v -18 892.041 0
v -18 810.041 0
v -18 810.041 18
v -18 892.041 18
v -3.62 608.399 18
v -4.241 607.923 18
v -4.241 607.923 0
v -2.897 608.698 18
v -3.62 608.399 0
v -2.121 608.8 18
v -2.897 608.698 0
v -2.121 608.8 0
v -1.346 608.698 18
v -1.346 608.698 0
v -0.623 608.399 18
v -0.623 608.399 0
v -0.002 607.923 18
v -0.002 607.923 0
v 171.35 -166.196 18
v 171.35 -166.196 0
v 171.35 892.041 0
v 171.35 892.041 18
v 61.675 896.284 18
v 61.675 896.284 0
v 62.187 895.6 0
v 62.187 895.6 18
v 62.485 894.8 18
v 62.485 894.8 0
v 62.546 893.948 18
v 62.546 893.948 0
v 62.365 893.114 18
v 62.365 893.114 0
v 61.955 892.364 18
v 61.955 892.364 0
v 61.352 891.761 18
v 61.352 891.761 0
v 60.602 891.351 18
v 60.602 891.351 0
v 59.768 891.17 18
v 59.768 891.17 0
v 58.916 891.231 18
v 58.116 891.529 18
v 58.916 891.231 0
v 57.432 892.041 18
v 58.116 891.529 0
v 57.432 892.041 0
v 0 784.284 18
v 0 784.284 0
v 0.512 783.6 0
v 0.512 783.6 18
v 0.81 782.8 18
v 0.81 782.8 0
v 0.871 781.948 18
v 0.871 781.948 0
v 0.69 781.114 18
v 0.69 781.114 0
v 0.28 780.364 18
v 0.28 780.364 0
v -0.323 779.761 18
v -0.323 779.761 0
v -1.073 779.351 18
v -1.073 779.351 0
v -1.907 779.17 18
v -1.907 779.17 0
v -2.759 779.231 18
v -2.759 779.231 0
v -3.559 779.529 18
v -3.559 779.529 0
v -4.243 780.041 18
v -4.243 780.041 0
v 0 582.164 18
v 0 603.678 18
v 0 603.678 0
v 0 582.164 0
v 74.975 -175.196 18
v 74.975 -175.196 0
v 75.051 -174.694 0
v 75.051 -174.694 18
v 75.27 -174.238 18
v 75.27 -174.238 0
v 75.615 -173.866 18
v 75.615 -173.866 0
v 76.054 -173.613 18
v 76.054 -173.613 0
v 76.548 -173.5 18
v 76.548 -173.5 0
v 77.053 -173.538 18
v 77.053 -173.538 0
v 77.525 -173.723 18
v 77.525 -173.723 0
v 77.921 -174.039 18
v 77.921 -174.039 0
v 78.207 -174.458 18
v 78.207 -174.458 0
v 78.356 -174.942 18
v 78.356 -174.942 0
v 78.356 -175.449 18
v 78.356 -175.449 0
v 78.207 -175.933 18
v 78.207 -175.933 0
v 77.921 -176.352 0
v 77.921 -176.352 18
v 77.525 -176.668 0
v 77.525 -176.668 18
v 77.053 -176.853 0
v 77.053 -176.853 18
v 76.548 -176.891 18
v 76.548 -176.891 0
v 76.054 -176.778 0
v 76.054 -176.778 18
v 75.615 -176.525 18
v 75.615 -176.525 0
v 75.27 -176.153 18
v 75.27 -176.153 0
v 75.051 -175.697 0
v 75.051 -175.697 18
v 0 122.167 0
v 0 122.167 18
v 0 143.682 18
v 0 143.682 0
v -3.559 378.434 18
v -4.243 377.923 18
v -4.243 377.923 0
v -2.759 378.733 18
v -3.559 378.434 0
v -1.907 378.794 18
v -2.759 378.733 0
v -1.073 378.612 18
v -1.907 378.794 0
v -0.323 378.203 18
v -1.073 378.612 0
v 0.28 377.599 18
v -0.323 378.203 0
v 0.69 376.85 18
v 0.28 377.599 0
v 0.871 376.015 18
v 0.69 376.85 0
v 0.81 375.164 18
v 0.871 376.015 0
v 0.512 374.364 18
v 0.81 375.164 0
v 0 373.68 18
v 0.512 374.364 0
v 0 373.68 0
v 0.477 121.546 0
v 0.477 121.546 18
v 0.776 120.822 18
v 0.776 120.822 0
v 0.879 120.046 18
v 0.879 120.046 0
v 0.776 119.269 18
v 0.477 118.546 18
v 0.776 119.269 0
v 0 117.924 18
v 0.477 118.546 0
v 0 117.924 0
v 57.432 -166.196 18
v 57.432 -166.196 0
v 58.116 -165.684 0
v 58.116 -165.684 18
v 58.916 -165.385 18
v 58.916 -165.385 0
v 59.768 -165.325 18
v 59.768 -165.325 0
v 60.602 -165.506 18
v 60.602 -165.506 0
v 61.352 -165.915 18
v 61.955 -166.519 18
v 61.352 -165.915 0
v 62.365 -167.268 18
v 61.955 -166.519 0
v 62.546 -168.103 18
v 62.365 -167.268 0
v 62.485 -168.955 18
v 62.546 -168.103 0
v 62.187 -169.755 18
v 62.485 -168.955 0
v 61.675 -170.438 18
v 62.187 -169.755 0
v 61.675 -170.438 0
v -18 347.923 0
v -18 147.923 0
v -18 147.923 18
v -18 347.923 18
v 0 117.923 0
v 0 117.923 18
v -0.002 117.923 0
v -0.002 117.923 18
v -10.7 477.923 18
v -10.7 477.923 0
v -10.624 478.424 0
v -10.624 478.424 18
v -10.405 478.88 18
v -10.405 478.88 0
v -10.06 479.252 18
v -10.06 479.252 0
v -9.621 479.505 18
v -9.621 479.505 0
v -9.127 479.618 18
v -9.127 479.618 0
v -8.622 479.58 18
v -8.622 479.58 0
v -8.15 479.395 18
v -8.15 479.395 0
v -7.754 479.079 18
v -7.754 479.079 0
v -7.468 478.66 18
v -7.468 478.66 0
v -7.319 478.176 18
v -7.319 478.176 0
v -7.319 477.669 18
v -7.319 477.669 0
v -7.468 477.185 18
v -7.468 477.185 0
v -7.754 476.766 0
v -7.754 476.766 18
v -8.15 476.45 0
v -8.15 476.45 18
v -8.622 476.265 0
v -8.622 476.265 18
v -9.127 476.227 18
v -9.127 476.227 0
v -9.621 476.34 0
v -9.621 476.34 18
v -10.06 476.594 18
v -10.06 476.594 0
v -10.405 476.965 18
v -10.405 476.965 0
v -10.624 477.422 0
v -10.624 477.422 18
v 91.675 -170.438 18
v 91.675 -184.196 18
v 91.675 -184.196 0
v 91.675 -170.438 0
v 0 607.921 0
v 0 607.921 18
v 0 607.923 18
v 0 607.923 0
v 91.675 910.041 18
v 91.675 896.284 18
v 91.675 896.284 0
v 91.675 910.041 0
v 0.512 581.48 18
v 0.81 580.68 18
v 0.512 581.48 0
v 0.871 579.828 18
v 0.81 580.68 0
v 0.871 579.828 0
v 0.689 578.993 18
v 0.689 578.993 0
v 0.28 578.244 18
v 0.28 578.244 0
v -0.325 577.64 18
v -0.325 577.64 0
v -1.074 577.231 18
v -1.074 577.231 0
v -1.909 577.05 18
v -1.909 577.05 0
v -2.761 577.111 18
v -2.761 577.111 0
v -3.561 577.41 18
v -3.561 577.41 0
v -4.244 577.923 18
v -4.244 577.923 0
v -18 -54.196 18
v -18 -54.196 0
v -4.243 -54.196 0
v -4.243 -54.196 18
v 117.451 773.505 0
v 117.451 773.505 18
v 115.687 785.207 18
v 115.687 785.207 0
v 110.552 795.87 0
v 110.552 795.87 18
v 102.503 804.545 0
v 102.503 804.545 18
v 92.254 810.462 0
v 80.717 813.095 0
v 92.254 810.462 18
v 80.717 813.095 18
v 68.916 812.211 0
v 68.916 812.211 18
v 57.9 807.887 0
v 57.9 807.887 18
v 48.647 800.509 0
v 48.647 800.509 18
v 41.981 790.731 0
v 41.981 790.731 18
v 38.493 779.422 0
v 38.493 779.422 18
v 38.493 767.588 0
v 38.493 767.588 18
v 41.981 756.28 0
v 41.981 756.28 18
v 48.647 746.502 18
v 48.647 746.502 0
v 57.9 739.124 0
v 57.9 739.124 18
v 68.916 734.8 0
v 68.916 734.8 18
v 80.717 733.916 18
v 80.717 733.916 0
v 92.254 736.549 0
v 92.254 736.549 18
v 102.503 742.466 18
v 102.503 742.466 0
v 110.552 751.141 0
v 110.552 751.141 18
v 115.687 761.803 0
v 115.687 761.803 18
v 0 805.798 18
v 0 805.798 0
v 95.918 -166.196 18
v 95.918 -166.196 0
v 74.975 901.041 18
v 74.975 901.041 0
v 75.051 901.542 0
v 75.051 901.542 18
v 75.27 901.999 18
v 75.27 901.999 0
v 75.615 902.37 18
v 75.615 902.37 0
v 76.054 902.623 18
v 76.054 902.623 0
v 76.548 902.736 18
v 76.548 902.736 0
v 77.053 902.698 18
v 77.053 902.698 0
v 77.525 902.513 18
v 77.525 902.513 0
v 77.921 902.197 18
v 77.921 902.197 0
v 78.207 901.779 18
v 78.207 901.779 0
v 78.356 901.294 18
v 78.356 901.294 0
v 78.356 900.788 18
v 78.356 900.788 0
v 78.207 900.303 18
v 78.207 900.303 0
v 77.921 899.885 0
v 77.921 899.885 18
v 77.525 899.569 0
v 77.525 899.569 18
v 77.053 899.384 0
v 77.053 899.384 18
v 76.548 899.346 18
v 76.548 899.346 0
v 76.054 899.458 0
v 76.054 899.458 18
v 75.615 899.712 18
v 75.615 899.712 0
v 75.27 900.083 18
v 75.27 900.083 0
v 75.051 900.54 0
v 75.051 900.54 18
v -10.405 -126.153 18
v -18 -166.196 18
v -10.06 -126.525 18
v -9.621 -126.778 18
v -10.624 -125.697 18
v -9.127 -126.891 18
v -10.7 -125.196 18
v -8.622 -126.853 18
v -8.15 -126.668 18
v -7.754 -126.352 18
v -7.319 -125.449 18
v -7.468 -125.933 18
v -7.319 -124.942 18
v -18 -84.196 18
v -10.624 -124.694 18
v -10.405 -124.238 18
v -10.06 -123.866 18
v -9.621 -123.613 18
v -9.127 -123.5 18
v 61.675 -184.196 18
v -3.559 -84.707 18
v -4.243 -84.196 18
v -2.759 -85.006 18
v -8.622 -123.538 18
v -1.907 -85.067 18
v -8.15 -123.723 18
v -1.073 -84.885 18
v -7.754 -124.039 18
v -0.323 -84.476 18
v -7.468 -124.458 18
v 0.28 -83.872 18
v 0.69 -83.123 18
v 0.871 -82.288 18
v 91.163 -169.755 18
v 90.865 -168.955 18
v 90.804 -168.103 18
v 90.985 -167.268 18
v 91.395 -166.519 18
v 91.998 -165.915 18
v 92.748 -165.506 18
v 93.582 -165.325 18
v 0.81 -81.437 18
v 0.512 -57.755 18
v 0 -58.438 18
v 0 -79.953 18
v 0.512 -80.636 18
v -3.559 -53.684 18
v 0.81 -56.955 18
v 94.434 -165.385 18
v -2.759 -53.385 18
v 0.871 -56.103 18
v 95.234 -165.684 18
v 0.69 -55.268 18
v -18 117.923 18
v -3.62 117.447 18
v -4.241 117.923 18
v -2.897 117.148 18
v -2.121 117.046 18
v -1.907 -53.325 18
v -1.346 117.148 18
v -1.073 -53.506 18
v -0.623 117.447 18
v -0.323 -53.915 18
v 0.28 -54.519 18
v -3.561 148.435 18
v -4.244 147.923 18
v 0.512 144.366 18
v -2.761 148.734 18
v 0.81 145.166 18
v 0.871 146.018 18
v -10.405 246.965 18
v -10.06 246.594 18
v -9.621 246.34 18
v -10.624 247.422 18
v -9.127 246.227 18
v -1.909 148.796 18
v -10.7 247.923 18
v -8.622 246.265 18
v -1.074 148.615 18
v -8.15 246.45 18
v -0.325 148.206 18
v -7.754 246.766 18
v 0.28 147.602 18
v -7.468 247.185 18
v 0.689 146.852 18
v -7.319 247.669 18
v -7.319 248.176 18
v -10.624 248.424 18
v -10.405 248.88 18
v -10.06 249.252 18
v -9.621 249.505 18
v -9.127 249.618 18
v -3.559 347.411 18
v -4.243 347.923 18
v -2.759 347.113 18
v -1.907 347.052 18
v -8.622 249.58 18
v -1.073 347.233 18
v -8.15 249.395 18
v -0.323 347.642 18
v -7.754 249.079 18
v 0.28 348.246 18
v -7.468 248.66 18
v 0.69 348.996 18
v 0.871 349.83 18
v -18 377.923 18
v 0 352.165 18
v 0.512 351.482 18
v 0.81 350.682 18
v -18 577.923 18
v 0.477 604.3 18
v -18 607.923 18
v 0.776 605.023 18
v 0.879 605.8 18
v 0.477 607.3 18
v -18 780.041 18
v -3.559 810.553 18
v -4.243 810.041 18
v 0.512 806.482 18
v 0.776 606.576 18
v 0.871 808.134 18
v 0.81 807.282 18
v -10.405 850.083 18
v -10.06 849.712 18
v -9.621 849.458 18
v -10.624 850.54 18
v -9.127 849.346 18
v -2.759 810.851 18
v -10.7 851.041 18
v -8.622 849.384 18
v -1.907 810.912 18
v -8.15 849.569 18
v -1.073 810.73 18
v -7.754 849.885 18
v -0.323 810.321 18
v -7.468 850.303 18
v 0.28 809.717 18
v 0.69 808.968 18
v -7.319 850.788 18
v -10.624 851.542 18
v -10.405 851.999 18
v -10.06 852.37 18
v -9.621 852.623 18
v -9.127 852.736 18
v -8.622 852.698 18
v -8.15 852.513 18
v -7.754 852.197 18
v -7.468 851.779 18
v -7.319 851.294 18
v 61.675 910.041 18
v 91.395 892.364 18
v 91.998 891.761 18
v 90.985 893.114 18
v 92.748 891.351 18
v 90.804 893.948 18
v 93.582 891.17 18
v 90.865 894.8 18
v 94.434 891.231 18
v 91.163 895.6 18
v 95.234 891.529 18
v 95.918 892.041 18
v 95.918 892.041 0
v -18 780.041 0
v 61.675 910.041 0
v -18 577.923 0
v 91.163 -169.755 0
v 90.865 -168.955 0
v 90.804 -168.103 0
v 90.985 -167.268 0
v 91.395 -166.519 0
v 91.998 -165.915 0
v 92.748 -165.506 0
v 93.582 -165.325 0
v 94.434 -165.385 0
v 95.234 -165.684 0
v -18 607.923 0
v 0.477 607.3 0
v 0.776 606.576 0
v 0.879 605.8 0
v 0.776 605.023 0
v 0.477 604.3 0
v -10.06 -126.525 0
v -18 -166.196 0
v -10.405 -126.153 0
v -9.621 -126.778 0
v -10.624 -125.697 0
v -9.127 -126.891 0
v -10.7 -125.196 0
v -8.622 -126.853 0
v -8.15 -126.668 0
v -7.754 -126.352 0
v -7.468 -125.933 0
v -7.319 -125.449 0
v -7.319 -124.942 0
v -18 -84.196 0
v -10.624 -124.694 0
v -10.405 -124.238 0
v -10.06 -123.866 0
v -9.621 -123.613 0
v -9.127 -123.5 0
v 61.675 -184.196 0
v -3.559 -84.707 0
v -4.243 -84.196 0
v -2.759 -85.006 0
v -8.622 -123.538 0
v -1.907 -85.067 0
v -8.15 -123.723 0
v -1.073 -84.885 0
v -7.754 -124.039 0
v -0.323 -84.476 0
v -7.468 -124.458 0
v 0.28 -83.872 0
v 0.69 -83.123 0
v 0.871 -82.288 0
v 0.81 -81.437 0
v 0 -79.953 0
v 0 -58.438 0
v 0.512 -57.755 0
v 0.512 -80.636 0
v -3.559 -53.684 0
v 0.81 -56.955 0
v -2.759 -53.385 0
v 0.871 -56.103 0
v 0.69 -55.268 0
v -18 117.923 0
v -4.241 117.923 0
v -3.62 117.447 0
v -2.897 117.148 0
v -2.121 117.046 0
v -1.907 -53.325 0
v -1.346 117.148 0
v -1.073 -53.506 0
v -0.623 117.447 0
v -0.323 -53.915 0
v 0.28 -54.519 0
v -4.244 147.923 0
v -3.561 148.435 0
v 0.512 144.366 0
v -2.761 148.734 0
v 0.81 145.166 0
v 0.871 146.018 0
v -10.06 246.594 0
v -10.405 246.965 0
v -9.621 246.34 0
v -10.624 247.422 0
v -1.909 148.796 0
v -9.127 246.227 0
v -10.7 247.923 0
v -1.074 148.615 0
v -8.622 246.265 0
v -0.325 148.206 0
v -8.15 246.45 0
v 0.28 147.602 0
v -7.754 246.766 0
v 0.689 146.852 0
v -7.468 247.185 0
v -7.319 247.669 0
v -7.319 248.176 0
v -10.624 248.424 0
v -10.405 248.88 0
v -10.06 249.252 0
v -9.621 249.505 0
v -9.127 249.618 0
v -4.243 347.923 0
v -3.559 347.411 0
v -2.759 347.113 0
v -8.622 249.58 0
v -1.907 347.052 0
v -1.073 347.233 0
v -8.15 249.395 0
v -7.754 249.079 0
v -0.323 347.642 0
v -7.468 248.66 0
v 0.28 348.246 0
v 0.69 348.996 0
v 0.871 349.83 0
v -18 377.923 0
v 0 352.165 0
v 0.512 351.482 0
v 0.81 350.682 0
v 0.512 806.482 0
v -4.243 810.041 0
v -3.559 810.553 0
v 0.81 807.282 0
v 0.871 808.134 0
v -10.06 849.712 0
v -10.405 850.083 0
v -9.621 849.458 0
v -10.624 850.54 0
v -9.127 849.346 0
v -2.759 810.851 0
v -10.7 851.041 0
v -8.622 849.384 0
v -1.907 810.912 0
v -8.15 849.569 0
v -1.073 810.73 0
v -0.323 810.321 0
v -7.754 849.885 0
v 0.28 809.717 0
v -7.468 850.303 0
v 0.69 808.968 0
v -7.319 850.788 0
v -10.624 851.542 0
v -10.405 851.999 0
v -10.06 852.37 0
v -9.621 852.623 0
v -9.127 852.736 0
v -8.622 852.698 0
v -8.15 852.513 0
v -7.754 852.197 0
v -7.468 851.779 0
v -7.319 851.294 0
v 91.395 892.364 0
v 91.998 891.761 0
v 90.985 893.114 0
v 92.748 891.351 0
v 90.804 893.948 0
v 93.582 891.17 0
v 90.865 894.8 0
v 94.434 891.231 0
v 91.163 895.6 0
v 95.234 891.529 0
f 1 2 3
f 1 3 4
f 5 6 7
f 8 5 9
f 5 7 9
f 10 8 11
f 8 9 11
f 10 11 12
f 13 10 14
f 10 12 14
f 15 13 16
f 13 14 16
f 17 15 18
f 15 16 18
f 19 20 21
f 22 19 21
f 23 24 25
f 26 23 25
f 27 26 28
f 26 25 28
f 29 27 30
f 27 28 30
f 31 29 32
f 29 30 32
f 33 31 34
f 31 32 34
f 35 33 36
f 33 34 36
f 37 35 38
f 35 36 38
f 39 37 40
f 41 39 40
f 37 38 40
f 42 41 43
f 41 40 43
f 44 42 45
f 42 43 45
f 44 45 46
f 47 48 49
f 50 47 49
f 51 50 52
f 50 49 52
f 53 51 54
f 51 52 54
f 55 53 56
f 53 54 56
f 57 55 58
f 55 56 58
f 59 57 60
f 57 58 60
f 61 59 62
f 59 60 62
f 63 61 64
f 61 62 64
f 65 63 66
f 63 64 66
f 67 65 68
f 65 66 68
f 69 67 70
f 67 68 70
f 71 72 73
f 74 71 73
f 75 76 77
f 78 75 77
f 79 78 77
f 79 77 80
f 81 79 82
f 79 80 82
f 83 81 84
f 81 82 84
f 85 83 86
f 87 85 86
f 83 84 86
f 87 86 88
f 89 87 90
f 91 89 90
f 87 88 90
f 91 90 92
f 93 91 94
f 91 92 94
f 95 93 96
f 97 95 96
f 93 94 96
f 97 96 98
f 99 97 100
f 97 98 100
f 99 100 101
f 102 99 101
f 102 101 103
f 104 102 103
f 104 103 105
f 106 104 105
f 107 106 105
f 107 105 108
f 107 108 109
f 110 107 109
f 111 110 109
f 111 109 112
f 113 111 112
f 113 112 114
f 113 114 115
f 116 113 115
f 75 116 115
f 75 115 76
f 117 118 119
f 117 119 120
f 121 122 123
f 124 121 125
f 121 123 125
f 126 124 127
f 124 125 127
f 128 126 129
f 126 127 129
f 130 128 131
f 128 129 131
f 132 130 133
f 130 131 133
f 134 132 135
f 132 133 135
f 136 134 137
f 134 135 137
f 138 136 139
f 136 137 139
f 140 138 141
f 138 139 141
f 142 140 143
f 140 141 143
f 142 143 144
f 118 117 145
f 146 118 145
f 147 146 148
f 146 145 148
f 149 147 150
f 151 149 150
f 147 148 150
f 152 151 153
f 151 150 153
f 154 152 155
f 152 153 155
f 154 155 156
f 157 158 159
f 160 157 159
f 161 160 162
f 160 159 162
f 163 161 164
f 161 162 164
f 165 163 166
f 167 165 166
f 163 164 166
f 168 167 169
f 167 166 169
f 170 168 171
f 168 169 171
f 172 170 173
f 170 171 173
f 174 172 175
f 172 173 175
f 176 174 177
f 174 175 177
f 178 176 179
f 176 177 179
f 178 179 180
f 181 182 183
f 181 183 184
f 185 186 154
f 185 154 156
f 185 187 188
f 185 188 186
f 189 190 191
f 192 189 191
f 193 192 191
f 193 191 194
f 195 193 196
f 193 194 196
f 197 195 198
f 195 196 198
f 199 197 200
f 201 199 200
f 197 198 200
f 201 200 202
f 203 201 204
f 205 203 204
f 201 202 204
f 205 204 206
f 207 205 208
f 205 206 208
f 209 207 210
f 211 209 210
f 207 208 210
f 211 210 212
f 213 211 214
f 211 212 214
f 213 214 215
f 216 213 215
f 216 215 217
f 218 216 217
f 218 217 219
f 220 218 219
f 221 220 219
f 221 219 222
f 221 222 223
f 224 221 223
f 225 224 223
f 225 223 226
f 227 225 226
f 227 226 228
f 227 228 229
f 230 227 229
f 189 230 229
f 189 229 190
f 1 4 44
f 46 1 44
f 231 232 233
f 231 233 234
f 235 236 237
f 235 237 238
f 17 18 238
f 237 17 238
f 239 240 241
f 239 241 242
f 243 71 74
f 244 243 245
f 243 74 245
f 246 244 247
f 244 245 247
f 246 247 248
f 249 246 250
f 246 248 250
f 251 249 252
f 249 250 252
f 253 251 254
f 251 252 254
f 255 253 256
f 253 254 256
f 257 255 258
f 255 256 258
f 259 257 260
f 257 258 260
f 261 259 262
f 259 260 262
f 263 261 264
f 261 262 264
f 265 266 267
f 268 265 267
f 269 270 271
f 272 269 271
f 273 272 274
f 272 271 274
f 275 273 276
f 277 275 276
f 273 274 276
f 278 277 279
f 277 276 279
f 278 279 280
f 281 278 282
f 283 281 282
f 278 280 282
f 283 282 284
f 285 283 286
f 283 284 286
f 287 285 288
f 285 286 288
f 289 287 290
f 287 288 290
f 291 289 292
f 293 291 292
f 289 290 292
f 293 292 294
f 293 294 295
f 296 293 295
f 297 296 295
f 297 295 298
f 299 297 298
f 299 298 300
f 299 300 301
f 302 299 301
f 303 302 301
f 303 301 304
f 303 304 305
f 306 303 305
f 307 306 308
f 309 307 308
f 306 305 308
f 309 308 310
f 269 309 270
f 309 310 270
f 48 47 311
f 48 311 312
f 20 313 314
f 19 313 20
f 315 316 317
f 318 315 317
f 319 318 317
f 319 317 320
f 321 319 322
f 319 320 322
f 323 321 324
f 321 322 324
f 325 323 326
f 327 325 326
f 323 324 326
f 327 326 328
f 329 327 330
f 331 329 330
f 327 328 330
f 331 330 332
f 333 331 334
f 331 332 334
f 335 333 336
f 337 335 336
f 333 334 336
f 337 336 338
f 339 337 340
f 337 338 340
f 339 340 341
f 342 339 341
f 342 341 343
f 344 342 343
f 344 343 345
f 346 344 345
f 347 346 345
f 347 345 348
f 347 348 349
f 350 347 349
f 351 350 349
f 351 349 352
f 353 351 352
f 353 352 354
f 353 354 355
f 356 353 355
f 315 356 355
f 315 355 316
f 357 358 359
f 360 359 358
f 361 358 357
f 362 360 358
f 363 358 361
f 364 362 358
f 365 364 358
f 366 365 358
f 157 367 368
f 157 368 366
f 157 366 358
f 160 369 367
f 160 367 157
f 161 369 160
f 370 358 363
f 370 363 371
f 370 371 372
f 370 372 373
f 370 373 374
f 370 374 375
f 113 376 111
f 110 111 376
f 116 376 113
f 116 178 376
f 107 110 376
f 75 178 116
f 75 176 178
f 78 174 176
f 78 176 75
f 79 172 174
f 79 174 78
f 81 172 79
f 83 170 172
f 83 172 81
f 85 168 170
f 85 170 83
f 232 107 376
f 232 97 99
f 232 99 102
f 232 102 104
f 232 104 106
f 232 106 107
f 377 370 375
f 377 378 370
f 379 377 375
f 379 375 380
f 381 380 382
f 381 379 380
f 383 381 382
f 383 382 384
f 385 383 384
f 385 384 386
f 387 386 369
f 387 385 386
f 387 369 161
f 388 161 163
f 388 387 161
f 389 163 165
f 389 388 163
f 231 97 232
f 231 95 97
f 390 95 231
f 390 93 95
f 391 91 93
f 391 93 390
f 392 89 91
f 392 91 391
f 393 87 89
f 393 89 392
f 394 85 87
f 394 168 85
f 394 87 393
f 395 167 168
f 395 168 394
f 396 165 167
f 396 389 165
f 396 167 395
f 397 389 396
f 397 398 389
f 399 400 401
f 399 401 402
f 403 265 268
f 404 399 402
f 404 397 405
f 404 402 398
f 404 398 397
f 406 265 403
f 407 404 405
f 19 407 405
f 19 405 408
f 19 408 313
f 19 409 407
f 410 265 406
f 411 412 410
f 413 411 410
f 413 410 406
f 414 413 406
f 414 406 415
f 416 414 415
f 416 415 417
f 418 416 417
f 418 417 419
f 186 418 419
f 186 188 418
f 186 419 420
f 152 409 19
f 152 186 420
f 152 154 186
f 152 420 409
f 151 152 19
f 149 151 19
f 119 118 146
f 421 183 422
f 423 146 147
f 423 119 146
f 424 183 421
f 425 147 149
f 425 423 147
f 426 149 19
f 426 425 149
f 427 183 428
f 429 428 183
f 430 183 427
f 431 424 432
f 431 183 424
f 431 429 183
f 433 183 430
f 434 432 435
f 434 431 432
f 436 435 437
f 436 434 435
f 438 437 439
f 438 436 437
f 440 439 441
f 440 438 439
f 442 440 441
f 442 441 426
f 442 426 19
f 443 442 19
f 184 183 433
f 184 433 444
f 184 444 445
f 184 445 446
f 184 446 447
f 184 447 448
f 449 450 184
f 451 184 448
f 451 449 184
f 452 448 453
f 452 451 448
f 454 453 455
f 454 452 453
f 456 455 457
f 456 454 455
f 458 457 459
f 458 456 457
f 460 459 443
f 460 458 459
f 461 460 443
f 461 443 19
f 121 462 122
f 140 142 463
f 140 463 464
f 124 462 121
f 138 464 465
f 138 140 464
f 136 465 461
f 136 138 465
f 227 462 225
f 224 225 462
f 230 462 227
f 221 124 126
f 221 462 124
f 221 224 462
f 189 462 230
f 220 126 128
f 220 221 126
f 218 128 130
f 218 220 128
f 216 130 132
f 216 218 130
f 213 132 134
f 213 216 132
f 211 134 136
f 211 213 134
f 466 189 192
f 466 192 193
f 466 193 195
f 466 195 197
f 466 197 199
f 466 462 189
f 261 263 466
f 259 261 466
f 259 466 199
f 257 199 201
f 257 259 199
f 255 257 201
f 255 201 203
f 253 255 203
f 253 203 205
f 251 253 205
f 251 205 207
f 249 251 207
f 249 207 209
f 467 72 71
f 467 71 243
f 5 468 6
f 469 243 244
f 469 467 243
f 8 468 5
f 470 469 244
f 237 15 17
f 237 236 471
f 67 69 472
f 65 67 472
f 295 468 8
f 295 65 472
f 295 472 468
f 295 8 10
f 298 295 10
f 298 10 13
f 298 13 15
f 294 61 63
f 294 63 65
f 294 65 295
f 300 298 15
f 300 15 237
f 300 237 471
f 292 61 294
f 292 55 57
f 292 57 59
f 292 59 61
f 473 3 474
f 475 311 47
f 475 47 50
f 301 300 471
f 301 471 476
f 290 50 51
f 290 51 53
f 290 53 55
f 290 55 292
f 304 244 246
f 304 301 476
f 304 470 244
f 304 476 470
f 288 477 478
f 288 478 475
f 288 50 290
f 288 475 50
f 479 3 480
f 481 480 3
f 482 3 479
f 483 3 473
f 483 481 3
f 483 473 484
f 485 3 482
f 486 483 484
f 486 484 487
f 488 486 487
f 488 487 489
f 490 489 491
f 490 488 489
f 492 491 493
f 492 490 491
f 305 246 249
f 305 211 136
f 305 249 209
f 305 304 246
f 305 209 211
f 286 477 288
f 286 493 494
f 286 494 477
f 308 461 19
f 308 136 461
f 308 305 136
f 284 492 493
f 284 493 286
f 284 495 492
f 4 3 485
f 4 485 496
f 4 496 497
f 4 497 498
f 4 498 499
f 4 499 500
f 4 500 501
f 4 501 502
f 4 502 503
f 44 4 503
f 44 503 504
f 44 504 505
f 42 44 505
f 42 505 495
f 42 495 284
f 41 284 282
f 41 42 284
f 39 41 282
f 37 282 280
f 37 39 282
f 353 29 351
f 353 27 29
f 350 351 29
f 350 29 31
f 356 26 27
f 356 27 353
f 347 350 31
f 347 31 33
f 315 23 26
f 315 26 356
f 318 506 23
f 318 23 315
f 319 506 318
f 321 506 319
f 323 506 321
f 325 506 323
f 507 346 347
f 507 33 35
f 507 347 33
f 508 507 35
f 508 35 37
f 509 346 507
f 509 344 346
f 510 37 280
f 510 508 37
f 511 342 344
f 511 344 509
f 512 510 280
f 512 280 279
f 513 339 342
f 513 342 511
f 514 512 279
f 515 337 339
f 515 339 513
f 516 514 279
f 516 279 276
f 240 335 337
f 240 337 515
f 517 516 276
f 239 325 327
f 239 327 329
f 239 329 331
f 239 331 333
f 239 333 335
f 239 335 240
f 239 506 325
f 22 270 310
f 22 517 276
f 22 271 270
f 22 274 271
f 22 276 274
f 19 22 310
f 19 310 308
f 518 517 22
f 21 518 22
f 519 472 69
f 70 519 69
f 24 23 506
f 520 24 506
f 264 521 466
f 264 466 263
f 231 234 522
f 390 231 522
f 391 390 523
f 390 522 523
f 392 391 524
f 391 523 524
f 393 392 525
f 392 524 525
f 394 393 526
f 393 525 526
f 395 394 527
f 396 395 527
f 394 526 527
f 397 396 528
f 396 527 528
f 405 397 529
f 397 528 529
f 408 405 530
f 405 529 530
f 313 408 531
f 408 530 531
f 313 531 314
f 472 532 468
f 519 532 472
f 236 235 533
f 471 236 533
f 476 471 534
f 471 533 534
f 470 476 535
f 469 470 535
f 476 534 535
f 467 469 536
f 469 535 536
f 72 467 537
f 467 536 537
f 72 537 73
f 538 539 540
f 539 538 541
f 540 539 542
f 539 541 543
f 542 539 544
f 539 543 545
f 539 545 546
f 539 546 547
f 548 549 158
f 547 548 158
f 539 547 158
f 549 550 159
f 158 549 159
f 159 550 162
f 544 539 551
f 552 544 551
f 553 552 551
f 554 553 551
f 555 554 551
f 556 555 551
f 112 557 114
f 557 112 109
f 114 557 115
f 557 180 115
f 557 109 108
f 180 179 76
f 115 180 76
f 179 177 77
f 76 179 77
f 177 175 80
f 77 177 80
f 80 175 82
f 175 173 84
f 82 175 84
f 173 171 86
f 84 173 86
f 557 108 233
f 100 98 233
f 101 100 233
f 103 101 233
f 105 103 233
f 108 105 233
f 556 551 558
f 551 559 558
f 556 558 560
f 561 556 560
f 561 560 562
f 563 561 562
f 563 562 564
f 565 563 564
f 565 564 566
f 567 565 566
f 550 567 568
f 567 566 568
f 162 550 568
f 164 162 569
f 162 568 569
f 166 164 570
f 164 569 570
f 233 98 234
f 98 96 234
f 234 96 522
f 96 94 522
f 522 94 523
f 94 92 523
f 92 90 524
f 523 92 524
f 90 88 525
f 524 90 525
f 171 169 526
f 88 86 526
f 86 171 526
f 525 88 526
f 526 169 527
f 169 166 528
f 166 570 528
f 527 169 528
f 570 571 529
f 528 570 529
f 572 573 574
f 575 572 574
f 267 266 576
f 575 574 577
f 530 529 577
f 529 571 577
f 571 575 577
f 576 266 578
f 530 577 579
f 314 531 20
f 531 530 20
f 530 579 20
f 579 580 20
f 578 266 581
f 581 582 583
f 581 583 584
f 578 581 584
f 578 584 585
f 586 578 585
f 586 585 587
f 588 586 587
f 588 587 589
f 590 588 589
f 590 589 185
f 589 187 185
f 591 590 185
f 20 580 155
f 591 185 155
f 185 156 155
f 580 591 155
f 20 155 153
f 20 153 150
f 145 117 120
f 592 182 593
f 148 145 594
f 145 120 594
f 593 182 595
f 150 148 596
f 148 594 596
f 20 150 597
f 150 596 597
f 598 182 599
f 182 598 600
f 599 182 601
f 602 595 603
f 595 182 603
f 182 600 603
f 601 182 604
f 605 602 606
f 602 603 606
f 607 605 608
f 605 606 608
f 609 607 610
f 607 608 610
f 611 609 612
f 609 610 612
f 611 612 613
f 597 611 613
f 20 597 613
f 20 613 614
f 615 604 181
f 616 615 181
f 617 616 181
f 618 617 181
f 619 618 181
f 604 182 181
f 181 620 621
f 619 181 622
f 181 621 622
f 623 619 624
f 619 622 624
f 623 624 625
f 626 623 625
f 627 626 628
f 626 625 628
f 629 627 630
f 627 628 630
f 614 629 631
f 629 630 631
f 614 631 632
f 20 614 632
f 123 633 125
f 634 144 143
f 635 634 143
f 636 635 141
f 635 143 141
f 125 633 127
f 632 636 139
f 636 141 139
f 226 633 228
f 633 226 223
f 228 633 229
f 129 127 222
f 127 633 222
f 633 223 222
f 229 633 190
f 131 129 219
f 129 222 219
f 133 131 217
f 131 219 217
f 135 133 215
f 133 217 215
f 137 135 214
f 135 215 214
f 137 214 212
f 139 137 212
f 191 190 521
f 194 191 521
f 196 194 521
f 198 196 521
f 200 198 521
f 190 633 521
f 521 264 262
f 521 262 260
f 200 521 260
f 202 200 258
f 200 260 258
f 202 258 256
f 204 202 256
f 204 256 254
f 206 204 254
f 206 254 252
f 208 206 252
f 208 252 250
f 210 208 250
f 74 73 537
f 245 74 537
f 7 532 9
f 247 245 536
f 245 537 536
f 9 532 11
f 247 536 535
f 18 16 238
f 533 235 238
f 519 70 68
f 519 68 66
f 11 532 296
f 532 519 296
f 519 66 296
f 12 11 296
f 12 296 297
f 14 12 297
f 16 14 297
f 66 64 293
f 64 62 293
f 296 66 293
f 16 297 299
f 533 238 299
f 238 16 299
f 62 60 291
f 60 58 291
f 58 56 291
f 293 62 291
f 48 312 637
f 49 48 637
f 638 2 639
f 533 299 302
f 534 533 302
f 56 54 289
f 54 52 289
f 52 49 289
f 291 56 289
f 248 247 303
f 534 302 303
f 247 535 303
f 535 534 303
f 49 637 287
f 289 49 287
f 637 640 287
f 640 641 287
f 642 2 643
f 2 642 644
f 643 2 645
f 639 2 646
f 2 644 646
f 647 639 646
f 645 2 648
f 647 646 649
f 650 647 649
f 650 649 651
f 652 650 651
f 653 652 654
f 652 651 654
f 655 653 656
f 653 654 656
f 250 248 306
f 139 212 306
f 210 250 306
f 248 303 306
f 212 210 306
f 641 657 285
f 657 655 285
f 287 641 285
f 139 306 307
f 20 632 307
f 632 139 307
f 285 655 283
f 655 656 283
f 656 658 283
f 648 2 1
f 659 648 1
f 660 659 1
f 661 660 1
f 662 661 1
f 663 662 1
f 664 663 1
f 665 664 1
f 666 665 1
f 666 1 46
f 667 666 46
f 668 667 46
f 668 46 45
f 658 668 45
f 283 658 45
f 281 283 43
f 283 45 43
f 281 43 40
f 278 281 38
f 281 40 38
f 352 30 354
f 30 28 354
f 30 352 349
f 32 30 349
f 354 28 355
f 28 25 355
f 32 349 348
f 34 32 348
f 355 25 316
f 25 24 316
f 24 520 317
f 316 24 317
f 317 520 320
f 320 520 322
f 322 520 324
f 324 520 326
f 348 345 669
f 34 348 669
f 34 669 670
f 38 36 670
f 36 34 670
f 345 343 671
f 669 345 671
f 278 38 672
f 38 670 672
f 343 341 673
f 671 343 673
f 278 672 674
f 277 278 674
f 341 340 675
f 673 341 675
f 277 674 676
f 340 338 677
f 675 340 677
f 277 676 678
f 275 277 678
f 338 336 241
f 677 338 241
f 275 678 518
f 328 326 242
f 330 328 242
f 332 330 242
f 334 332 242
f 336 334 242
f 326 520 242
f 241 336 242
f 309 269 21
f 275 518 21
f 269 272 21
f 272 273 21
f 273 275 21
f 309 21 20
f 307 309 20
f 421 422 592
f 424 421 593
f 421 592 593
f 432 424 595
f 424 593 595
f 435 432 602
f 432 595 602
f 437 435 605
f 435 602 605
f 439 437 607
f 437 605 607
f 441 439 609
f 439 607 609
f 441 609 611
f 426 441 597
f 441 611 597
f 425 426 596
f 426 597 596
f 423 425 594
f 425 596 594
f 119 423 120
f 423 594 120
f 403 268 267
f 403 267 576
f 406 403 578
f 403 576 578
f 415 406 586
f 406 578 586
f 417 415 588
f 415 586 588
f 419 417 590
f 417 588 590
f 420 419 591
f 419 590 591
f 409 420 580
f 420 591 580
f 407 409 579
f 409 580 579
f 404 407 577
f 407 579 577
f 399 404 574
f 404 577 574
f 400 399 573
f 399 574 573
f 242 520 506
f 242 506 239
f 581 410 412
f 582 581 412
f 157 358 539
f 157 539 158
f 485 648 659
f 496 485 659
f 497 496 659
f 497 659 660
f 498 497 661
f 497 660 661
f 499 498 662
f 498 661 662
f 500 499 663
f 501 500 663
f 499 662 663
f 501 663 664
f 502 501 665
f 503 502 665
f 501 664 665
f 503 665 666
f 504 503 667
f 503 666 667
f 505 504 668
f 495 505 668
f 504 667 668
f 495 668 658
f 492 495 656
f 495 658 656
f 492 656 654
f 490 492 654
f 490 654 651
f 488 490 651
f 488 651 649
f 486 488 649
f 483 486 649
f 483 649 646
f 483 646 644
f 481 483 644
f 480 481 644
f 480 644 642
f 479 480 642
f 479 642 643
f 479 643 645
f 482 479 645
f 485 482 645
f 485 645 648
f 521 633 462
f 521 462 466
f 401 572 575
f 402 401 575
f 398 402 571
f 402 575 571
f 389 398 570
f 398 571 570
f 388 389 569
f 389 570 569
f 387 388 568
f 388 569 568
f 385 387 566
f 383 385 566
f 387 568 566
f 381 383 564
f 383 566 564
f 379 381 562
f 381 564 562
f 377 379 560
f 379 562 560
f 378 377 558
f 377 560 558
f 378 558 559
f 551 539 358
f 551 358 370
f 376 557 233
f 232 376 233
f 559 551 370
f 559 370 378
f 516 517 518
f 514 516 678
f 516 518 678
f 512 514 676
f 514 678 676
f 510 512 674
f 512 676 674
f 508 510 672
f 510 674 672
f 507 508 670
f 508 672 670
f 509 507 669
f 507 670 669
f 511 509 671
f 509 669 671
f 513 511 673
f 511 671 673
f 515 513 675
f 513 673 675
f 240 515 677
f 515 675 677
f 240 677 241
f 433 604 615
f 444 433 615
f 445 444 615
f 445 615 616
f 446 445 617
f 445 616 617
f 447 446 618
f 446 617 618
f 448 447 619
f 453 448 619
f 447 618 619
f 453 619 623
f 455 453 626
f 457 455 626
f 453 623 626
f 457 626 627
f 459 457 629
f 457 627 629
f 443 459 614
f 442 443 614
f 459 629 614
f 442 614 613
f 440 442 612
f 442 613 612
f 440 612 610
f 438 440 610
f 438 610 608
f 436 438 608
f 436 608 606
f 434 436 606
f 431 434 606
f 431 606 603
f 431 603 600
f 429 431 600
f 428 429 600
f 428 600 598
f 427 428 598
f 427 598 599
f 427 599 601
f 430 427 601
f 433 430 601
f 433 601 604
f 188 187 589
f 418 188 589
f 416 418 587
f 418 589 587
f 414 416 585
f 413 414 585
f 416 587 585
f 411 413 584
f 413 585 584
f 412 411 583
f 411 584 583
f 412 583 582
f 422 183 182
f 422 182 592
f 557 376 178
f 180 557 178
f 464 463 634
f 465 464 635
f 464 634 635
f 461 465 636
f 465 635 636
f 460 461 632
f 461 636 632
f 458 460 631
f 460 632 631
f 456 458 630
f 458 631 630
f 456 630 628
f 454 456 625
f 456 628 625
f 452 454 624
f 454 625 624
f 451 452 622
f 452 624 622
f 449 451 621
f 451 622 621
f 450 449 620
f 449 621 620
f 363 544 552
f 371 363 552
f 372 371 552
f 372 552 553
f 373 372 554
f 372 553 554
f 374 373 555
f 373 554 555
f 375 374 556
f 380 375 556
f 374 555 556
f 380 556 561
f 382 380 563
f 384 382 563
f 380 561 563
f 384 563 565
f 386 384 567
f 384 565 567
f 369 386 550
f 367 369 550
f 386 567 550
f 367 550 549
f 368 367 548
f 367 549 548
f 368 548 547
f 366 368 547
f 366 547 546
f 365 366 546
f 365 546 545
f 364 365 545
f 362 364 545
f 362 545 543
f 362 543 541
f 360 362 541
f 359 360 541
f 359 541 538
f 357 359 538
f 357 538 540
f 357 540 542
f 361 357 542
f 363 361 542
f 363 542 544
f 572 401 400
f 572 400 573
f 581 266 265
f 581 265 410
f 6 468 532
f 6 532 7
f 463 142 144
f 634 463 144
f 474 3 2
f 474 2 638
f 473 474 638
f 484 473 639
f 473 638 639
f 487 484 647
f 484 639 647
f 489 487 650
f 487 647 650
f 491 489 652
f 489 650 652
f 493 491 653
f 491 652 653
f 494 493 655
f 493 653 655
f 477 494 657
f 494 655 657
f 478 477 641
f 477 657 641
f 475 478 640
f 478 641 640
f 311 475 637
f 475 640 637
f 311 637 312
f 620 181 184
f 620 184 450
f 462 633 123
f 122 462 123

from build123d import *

# Parameters (mm, degrees)
SKETCH1_W            = 189.35
SKETCH1_H            = 1094.236516537
BOSS_EXTRUDE1_DEPTH  = 18
CAVITY1_START        = -84.195551816
CAVITY1_OUTLINE_W    = 18
CAVITY1_OUTLINE_H    = 18
CAVITY1_DEPTH        = 30
CAVITY1_START_2      = 117.922706453
CAVITY1_2_OUTLINE_W  = 18
CAVITY1_2_OUTLINE_H  = 18
CAVITY1_2_DEPTH      = 30
CAVITY1_START_3      = 347.922706453
CAVITY1_3_OUTLINE_W  = 18
CAVITY1_3_OUTLINE_H  = 18
CAVITY1_3_DEPTH      = 30
CAVITY1_START_4      = 577.922706453
CAVITY1_4_OUTLINE_W  = 18
CAVITY1_4_OUTLINE_H  = 18
CAVITY1_4_DEPTH      = 30
CAVITY1_START_5      = 780.040964722
CAVITY1_5_OUTLINE_W  = 18
CAVITY1_5_OUTLINE_H  = 18
CAVITY1_5_DEPTH      = 30
SKETCH2_W            = 79.675
SKETCH2_H            = 18
CUT_EXTRUDE1_DEPTH   = 18
SKETCH3_R            = 39.700513166
CUT_EXTRUDE2_DEPTH   = 18
M3_CLEARANCE_HOLE1_D = 3.4
SKETCH7_R            = 3
CUT_EXTRUDE3_DEPTH   = 20


# Read off the part's stored shape, not the designer's step: Cavity1
with BuildPart() as part:
    # Sketch1 → Boss-Extrude1 (new body)
    with BuildSketch(Plane.XY):
        with Locations((76.675, 362.922706452)):
            Rectangle(SKETCH1_W, SKETCH1_H)
    extrude(amount=BOSS_EXTRUDE1_DEPTH)

    # Cavity1 outline → Cavity1 (cut)
    with BuildSketch(Plane(origin=(0, 0, 0), x_dir=(1, 0, 0), z_dir=(0, 1, 0)).offset(CAVITY1_START)):
        with Locations((-9, -9)):
            Rectangle(CAVITY1_OUTLINE_W, CAVITY1_OUTLINE_H)
    extrude(amount=CAVITY1_DEPTH, mode=Mode.SUBTRACT)

    # Cavity1 2 outline → Cavity1 2 (cut)
    with BuildSketch(Plane(origin=(0, 0, 0), x_dir=(1, 0, 0), z_dir=(0, 1, 0)).offset(CAVITY1_START_2)):
        with Locations((-9, -9)):
            Rectangle(CAVITY1_2_OUTLINE_W, CAVITY1_2_OUTLINE_H)
    extrude(amount=CAVITY1_2_DEPTH, mode=Mode.SUBTRACT)

    # Cavity1 3 outline → Cavity1 3 (cut)
    with BuildSketch(Plane(origin=(0, 0, 0), x_dir=(1, 0, 0), z_dir=(0, 1, 0)).offset(CAVITY1_START_3)):
        with Locations((-9, -9)):
            Rectangle(CAVITY1_3_OUTLINE_W, CAVITY1_3_OUTLINE_H)
    extrude(amount=CAVITY1_3_DEPTH, mode=Mode.SUBTRACT)

    # Cavity1 4 outline → Cavity1 4 (cut)
    with BuildSketch(Plane(origin=(0, 0, 0), x_dir=(1, 0, 0), z_dir=(0, 1, 0)).offset(CAVITY1_START_4)):
        with Locations((-9, -9)):
            Rectangle(CAVITY1_4_OUTLINE_W, CAVITY1_4_OUTLINE_H)
    extrude(amount=CAVITY1_4_DEPTH, mode=Mode.SUBTRACT)

    # Cavity1 5 outline → Cavity1 5 (cut)
    with BuildSketch(Plane(origin=(0, 0, 0), x_dir=(1, 0, 0), z_dir=(0, 1, 0)).offset(CAVITY1_START_5)):
        with Locations((-9, -9)):
            Rectangle(CAVITY1_5_OUTLINE_W, CAVITY1_5_OUTLINE_H)
    extrude(amount=CAVITY1_5_DEPTH, mode=Mode.SUBTRACT)

    # Sketch2 → Cut-Extrude1 (cut)
    with BuildSketch(Plane.XY.offset(18)):
        with Locations((21.8375, -175.195551816)):
            Rectangle(SKETCH2_W, SKETCH2_H)
        with Locations((131.5125, -175.195551816)):
            Rectangle(SKETCH2_W, SKETCH2_H)
        with Locations((21.8375, 901.040964721)):
            Rectangle(SKETCH2_W, SKETCH2_H)
        with Locations((131.5125, 901.040964721)):
            Rectangle(SKETCH2_W, SKETCH2_H)
    extrude(amount=-CUT_EXTRUDE1_DEPTH, mode=Mode.SUBTRACT)

    # Sketch3 → Cut-Extrude2 (cut)
    with BuildSketch(Plane.XY.offset(18)):
        with Locations((77.75, 773.505430817)):
            Circle(SKETCH3_R)
    extrude(amount=-CUT_EXTRUDE2_DEPTH, mode=Mode.SUBTRACT)

    # M3 Clearance Hole1 (through all)
    with Locations(Plane.XY.offset(18)):
        with Locations((-9, 851.040964721), (-9, -125.195551816), (-9, 477.922706453), (-9, 247.922706453), (76.675, 901.040964721), (76.675, -175.195551816)):
            Hole(M3_CLEARANCE_HOLE1_D / 2)

    # Sketch7 → Cut-Extrude3 (cut)
    with BuildSketch(Plane(origin=(0, 0, 0), x_dir=(-1, 0, 0), z_dir=(0, 0, -1))):
        with Locations((2.121320344, -56.31687216)):
            Circle(SKETCH7_R)
        with Locations((2.121320344, -82.074231473)):
            Circle(SKETCH7_R)
        with Locations((2.121320344, 145.80312784)):
            Circle(SKETCH7_R)
        with Locations((2.121320344, 120.045768527)):
            Circle(SKETCH7_R)
        with Locations((2.121320344, 605.799644378)):
            Circle(SKETCH7_R)
        with Locations((2.121320344, 580.042285065)):
            Circle(SKETCH7_R)
        with Locations((2.121320344, 807.919644378)):
            Circle(SKETCH7_R)
        with Locations((2.121320344, 782.162285065)):
            Circle(SKETCH7_R)
        with Locations((2.121320344, 375.801386109)):
            Circle(SKETCH7_R)
        with Locations((2.121320344, 350.044026796)):
            Circle(SKETCH7_R)
        with Locations((-59.553679656, -168.31687216)):
            Circle(SKETCH7_R)
        with Locations((-93.796320344, -168.31687216)):
            Circle(SKETCH7_R)
        with Locations((-93.796320344, 894.162285065)):
            Circle(SKETCH7_R)
        with Locations((-59.553679656, 894.162285065)):
            Circle(SKETCH7_R)
    extrude(amount=-CUT_EXTRUDE3_DEPTH, mode=Mode.SUBTRACT)


solid = part.part
